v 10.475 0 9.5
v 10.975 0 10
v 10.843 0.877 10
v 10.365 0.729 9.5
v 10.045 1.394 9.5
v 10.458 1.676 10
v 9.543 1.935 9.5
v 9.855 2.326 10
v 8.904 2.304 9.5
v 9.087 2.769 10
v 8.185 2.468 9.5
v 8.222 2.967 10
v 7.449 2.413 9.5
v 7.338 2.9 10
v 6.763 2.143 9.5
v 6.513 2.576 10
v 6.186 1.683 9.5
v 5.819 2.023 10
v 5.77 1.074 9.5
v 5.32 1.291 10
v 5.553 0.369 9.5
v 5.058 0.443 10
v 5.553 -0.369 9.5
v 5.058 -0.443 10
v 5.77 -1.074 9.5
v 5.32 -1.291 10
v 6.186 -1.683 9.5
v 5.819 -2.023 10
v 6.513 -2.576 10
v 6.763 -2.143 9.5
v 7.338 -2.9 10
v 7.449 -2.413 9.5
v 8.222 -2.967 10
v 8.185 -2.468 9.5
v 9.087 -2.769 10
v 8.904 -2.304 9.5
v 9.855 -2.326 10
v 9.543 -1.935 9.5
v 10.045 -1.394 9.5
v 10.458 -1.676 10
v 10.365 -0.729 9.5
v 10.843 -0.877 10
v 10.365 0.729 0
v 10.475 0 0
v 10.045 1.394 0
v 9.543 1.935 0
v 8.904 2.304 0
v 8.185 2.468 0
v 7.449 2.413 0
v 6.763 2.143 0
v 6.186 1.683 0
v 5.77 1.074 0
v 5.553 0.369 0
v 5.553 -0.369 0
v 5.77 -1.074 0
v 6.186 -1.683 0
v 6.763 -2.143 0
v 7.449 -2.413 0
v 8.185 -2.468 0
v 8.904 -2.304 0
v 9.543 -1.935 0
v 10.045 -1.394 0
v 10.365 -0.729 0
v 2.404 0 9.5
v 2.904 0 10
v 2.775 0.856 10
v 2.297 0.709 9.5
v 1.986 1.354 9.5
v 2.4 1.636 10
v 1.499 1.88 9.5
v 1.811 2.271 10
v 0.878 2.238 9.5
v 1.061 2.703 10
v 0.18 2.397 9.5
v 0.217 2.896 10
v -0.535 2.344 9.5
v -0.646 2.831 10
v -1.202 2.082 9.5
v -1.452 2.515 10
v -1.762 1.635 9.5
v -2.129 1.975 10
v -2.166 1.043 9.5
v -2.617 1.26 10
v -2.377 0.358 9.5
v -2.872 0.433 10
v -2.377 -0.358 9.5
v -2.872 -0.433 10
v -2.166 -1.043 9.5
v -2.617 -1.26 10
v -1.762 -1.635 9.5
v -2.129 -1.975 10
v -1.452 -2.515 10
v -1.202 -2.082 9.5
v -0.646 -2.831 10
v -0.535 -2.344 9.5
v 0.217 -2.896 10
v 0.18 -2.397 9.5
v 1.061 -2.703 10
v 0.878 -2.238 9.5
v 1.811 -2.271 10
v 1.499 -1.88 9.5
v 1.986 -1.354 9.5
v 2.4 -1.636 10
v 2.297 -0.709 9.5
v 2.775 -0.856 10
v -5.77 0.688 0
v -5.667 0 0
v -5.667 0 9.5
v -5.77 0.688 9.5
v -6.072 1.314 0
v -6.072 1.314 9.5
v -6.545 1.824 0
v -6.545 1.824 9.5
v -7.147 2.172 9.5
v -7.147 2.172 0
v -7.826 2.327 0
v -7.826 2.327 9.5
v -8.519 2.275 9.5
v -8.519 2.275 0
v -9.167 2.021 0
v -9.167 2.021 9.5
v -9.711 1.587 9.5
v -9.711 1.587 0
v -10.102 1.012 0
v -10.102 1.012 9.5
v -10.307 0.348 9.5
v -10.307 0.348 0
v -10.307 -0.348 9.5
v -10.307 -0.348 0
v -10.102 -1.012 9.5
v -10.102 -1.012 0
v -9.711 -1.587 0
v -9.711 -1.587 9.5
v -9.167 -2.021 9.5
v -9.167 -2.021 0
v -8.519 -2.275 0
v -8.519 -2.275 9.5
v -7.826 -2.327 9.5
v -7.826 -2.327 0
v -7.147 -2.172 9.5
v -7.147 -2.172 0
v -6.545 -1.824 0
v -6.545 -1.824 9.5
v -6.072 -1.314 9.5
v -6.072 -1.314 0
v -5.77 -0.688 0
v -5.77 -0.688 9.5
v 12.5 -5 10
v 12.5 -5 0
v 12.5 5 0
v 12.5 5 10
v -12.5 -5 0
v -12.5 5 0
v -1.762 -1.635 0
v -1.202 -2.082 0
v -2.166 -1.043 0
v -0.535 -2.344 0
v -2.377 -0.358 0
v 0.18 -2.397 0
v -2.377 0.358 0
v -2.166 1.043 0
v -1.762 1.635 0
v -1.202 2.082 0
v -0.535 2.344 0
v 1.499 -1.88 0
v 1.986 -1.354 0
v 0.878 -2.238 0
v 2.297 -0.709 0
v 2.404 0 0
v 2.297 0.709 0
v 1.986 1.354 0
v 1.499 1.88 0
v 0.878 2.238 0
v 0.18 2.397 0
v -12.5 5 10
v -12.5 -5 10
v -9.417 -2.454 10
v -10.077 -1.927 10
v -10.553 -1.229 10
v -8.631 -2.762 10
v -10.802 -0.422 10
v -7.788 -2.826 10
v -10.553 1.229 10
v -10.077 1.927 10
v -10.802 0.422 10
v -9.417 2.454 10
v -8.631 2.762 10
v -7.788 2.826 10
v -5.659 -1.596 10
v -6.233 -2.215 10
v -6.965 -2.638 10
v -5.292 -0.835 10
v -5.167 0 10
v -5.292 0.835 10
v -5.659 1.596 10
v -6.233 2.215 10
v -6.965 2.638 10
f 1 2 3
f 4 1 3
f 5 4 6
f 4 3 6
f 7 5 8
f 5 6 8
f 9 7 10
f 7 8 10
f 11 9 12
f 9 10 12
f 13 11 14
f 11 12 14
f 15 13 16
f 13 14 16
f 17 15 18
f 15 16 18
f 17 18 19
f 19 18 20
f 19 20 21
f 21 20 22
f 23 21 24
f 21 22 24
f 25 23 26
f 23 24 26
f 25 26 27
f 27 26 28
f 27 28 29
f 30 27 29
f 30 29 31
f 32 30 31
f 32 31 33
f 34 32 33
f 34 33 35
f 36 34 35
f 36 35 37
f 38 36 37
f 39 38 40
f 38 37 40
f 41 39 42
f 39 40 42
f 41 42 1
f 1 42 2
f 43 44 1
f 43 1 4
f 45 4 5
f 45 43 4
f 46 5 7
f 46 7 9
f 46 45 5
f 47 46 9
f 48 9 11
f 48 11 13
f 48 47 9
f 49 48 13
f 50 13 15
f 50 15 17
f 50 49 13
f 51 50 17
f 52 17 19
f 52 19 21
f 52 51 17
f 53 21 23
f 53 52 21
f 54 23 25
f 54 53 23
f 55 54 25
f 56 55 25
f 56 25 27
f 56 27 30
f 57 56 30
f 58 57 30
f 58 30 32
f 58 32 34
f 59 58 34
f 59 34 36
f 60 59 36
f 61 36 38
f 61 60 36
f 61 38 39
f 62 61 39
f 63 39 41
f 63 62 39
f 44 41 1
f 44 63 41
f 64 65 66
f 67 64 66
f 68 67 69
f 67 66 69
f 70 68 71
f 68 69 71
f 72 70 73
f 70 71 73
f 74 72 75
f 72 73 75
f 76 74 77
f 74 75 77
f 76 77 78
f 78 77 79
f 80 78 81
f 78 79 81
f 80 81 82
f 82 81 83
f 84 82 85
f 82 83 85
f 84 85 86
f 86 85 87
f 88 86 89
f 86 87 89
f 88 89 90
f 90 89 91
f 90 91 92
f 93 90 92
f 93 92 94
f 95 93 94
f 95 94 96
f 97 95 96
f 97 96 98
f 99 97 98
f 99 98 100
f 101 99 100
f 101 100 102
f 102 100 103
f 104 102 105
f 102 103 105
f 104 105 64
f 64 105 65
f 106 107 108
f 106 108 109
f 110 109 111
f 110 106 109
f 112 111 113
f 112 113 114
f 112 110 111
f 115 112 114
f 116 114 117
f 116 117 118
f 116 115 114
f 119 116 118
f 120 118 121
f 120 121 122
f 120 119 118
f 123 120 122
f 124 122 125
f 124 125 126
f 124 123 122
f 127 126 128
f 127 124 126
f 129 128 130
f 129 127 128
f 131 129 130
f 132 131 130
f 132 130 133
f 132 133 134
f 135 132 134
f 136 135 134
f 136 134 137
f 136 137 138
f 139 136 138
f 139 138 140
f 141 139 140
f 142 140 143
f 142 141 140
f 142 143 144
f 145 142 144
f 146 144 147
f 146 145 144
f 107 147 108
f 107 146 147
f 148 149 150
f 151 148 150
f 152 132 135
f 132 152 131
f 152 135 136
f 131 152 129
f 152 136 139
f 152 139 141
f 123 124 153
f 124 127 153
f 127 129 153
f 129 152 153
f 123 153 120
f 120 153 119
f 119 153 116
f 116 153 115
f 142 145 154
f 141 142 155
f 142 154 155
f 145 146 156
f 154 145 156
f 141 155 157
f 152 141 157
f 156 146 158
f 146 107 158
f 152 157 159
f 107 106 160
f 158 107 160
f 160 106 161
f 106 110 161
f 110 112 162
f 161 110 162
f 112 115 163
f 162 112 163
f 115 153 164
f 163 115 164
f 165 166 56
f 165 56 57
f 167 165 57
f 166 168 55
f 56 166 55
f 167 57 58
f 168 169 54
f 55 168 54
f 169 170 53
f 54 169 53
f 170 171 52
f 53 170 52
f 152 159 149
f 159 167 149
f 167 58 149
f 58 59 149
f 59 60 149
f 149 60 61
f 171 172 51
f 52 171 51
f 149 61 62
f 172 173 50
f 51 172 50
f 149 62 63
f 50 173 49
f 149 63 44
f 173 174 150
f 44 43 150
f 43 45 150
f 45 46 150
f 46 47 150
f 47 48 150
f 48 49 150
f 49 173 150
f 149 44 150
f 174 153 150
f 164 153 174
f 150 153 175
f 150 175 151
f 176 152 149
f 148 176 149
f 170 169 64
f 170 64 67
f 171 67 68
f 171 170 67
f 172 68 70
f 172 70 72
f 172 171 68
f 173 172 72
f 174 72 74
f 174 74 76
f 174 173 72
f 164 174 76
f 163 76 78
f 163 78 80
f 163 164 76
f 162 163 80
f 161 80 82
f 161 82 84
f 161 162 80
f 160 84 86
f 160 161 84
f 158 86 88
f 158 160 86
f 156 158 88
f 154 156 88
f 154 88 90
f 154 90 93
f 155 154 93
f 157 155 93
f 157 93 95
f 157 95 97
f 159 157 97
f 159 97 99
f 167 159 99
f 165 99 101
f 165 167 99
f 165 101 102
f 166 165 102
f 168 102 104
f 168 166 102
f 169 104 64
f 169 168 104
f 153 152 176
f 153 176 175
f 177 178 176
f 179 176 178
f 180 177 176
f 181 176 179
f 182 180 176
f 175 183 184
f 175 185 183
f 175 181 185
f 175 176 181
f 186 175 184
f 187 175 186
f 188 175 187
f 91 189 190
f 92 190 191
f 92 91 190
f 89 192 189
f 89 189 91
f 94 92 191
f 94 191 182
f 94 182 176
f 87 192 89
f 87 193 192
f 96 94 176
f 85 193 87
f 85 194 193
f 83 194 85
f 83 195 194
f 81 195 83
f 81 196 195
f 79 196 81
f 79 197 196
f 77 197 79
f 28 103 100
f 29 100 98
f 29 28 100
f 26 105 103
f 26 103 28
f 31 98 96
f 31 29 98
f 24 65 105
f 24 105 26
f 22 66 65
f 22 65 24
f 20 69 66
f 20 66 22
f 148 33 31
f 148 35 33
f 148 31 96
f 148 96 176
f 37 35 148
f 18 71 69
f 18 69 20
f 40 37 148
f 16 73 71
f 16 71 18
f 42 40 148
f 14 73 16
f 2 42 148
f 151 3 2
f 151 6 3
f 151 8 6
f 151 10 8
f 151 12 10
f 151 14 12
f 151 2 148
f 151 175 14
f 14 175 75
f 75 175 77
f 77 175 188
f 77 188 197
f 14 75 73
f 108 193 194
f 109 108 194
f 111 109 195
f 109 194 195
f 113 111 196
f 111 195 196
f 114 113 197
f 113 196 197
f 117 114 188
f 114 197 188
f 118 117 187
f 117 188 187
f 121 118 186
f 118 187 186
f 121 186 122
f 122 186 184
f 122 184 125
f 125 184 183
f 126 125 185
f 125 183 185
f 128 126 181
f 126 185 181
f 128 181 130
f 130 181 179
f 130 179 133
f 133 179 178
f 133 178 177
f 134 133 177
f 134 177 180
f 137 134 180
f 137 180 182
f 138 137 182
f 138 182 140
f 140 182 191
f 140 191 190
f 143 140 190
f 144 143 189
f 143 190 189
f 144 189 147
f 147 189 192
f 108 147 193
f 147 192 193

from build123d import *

# Parameters (mm, degrees)
SKETCH1_W           = 25
SKETCH1_H           = 10
SKETCH1_R           = 2.404163056
SKETCH1_R_2         = 2.333452378
SKETCH1_R_3         = 2.474873734
BOSS_EXTRUDE1_DEPTH = 10
CHAMFER1_SIZE       = 0.5


with BuildPart() as part:
    # Sketch1 → Boss-Extrude1 (new body)
    with BuildSketch(Plane.XY):
        Rectangle(SKETCH1_W, SKETCH1_H)
        Circle(SKETCH1_R, mode=Mode.SUBTRACT)
        with Locations((-8, 0)):
            Circle(SKETCH1_R_2, mode=Mode.SUBTRACT)
        with Locations((8, 0)):
            Circle(SKETCH1_R_3, mode=Mode.SUBTRACT)
    extrude(amount=BOSS_EXTRUDE1_DEPTH)

    # Chamfer1
    chamfer1_edges = [part.edges().sort_by_distance(p)[0] for p in [
        (-2.404163056, 0, 10),
        (5.525126266, 0, 10),
        (-10.333452378, 0, 10),
    ]]
    chamfer(chamfer1_edges, length=CHAMFER1_SIZE)


solid = part.part
